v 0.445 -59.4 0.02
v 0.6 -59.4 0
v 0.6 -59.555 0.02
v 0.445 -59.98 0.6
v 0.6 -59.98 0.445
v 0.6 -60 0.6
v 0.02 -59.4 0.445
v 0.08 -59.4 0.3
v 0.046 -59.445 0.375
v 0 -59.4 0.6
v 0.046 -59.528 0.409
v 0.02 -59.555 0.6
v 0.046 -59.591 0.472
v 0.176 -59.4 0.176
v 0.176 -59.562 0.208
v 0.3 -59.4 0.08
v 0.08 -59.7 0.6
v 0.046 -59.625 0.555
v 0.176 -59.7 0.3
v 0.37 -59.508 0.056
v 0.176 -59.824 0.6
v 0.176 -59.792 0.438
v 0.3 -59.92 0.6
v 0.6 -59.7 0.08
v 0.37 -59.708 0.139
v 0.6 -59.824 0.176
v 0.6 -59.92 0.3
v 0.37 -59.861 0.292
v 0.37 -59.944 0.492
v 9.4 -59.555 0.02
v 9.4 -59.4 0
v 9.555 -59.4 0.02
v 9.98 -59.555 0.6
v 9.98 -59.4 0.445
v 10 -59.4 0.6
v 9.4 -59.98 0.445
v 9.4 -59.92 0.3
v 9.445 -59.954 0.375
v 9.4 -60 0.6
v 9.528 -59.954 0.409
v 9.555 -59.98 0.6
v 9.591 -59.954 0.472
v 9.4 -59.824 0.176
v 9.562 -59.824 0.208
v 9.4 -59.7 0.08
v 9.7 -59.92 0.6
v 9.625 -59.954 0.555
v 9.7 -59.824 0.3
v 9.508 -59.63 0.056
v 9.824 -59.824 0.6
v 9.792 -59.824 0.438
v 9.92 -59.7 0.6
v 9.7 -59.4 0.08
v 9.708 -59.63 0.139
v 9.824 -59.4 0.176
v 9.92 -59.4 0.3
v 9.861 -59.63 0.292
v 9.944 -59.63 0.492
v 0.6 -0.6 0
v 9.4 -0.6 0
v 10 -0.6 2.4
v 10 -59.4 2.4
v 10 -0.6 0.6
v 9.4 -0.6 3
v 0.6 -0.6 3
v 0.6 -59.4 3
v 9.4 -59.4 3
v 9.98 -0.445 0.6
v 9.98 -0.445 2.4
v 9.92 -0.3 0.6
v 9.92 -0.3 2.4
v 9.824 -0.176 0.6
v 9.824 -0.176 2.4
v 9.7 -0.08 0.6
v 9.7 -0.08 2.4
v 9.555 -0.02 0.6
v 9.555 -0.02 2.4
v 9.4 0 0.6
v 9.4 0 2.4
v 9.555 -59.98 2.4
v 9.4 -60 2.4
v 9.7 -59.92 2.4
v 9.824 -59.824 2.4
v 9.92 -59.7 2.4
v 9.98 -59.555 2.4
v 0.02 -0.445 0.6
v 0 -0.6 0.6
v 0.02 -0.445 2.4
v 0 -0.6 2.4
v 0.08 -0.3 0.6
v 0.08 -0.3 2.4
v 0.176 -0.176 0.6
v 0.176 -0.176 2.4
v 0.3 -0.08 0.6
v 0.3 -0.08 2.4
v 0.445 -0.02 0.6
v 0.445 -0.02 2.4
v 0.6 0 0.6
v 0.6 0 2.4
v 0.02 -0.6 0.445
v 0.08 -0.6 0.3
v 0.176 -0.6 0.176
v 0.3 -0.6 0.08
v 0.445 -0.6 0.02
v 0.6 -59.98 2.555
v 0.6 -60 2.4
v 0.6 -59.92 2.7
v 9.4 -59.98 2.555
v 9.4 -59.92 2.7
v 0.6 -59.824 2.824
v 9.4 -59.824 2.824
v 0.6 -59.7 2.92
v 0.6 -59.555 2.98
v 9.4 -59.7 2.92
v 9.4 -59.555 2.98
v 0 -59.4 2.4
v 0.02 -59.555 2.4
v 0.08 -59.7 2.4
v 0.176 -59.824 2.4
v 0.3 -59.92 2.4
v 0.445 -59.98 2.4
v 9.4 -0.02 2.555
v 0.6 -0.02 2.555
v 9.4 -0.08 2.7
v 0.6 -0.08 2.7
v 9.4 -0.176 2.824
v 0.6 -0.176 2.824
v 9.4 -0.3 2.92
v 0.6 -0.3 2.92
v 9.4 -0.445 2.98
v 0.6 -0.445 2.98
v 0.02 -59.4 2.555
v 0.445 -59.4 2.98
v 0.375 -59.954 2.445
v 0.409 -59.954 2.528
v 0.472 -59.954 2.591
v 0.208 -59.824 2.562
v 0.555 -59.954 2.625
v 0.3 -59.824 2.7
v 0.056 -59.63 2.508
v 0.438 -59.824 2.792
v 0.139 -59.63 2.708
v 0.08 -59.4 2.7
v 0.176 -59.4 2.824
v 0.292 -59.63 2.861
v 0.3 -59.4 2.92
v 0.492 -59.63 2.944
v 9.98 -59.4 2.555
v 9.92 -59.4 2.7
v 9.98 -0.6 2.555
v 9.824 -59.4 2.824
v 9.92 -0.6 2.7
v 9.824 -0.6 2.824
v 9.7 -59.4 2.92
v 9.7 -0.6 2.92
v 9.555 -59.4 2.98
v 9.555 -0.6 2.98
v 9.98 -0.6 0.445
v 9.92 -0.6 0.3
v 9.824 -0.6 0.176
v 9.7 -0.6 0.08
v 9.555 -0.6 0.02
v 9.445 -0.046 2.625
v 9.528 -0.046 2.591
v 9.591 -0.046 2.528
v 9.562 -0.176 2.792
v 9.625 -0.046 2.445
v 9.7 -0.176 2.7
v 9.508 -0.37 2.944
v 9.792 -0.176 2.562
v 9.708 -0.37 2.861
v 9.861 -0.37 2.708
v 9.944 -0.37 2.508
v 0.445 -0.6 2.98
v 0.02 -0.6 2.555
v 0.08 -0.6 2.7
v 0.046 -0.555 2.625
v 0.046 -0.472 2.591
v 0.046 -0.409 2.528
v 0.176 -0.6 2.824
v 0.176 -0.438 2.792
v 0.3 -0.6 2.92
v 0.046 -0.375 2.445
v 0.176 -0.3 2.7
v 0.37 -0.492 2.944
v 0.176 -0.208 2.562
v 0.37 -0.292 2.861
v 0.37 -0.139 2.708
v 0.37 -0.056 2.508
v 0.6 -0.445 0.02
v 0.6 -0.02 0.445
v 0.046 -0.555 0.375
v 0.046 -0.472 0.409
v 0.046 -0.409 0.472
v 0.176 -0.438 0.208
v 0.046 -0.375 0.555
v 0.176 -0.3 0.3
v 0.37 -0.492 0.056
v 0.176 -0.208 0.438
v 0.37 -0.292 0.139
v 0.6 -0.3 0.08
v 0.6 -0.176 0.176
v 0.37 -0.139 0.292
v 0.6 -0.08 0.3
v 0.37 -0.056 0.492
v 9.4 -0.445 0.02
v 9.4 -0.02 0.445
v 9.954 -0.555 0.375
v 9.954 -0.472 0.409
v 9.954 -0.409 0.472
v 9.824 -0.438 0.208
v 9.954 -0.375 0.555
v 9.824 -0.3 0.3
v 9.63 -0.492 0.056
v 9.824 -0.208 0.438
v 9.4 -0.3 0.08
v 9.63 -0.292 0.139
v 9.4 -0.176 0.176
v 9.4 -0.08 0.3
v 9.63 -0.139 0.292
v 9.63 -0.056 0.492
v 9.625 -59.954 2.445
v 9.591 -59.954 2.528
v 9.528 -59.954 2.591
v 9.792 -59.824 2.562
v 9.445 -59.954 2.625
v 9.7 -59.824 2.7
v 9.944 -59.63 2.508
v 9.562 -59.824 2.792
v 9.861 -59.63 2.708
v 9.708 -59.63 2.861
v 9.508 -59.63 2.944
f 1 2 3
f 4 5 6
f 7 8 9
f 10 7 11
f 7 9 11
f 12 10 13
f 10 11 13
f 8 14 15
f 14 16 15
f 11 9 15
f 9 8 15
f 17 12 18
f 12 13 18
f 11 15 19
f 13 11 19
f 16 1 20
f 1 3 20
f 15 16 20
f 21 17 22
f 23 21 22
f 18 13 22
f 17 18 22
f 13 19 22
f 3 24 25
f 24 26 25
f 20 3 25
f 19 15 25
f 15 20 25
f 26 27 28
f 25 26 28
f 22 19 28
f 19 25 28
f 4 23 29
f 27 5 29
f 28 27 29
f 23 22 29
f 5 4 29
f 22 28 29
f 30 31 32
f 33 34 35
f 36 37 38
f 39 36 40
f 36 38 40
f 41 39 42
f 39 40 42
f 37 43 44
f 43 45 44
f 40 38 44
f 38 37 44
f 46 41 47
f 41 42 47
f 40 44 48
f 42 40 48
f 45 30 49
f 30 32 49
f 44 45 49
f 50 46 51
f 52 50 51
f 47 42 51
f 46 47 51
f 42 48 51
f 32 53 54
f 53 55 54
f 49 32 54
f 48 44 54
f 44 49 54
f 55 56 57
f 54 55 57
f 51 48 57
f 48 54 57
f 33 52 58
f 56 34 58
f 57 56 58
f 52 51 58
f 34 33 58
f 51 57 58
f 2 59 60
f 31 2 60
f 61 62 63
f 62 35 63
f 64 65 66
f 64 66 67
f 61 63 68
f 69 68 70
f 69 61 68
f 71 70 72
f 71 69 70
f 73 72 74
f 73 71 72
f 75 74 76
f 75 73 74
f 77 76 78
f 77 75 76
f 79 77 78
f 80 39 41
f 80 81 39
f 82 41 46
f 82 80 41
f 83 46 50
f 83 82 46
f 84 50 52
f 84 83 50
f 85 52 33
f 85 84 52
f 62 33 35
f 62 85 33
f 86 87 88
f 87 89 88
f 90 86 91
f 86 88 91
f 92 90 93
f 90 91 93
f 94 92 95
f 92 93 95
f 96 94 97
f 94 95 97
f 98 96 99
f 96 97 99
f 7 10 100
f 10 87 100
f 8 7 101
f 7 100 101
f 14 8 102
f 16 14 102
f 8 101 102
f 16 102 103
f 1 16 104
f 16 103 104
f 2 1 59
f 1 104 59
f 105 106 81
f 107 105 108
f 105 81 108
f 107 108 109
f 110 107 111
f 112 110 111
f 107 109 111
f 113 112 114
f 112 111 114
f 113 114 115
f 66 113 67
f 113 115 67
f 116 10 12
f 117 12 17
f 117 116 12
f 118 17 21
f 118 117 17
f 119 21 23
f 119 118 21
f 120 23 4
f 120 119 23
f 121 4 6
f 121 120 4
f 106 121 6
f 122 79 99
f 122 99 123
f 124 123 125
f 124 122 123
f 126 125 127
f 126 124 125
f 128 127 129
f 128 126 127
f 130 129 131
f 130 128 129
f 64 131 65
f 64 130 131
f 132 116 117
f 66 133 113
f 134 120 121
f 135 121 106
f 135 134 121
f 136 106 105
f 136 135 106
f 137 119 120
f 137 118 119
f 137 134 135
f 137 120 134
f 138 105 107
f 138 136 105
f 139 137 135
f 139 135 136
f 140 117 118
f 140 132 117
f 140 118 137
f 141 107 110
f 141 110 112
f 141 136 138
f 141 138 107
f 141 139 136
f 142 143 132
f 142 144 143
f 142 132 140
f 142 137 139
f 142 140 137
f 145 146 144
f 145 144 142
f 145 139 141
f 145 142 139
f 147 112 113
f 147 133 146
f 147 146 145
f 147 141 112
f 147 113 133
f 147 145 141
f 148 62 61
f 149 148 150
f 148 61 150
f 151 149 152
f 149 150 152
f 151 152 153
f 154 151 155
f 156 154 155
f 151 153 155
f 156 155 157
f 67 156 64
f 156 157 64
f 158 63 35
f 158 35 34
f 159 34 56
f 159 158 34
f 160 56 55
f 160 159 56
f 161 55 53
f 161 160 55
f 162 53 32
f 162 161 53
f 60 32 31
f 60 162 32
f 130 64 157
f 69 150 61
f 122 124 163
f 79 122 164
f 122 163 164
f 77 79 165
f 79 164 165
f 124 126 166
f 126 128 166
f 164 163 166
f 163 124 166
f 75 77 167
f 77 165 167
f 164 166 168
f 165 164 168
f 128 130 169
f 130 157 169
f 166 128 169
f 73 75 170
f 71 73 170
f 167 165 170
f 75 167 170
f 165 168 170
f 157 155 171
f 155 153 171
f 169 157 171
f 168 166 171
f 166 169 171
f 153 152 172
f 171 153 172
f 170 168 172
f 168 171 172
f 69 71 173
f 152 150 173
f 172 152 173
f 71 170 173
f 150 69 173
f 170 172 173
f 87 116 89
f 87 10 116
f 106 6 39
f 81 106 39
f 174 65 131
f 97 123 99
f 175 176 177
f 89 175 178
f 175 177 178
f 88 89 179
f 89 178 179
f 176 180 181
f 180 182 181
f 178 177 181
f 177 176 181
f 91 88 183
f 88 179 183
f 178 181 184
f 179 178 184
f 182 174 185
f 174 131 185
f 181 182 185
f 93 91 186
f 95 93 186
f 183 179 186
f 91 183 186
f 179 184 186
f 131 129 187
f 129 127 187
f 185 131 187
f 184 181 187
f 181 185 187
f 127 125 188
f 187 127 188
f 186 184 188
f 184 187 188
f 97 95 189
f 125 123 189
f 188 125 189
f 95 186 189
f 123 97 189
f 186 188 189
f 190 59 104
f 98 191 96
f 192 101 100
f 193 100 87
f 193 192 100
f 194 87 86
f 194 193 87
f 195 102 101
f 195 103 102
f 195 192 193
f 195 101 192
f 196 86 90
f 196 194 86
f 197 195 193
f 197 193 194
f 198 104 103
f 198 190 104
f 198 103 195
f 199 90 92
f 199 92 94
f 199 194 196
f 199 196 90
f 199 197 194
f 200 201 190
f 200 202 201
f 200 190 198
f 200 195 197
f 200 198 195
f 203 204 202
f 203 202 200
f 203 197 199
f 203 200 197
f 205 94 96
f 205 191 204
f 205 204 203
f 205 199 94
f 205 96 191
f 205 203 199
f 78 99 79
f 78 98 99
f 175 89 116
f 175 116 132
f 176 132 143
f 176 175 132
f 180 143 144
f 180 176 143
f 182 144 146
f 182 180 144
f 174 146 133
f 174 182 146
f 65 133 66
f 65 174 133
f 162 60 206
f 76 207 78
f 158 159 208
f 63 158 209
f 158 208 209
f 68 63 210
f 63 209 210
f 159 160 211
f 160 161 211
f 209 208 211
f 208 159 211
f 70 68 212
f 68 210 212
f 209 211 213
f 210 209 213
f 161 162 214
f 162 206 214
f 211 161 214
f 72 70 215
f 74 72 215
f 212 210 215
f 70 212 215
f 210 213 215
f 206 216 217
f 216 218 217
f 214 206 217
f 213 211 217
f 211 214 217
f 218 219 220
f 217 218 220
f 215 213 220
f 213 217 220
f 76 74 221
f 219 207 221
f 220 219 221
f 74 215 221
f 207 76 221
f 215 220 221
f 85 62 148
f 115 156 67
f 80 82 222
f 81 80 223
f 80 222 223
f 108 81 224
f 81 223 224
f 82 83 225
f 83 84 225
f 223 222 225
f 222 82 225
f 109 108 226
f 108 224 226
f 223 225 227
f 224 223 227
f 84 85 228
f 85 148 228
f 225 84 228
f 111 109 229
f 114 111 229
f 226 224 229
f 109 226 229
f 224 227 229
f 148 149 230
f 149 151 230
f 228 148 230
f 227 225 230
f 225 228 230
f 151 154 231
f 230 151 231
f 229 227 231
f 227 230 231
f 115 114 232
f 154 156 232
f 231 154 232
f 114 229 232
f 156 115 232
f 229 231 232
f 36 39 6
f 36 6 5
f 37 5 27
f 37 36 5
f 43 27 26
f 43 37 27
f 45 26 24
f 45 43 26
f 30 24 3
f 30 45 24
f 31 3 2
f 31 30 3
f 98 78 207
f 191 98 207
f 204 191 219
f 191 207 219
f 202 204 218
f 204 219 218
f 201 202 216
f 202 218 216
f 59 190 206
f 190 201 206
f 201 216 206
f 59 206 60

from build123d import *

# Parameters (mm, degrees)
SKIZZE1_W                       = 10
SKIZZE1_H                       = 60
AUFSATZ_LINEAR_AUSTRAGEN1_DEPTH = 3
VERRUNDUNG1_R                   = 0.6


with BuildPart() as part:
    # Skizze1 → Aufsatz-Linear austragen1 (new body)
    with BuildSketch(Plane.XY):
        with Locations((5, -30)):
            Rectangle(SKIZZE1_W, SKIZZE1_H)
    extrude(amount=AUFSATZ_LINEAR_AUSTRAGEN1_DEPTH)

    # Verrundung1
    verrundung1_edges = [part.edges().sort_by_distance(p)[0] for p in [
        (10, -30, 3),
        (5, 0, 3),
        (0, -30, 3),
        (5, 0, 0),
        (10, -30, 0),
        (5, -60, 0),
        (0, -30, 0),
        (0, 0, 1.5),
        (10, 0, 1.5),
        (10, -60, 1.5),
        (0, -60, 1.5),
        (5, -60, 3),
    ]]
    fillet(verrundung1_edges, radius=VERRUNDUNG1_R)


solid = part.part
